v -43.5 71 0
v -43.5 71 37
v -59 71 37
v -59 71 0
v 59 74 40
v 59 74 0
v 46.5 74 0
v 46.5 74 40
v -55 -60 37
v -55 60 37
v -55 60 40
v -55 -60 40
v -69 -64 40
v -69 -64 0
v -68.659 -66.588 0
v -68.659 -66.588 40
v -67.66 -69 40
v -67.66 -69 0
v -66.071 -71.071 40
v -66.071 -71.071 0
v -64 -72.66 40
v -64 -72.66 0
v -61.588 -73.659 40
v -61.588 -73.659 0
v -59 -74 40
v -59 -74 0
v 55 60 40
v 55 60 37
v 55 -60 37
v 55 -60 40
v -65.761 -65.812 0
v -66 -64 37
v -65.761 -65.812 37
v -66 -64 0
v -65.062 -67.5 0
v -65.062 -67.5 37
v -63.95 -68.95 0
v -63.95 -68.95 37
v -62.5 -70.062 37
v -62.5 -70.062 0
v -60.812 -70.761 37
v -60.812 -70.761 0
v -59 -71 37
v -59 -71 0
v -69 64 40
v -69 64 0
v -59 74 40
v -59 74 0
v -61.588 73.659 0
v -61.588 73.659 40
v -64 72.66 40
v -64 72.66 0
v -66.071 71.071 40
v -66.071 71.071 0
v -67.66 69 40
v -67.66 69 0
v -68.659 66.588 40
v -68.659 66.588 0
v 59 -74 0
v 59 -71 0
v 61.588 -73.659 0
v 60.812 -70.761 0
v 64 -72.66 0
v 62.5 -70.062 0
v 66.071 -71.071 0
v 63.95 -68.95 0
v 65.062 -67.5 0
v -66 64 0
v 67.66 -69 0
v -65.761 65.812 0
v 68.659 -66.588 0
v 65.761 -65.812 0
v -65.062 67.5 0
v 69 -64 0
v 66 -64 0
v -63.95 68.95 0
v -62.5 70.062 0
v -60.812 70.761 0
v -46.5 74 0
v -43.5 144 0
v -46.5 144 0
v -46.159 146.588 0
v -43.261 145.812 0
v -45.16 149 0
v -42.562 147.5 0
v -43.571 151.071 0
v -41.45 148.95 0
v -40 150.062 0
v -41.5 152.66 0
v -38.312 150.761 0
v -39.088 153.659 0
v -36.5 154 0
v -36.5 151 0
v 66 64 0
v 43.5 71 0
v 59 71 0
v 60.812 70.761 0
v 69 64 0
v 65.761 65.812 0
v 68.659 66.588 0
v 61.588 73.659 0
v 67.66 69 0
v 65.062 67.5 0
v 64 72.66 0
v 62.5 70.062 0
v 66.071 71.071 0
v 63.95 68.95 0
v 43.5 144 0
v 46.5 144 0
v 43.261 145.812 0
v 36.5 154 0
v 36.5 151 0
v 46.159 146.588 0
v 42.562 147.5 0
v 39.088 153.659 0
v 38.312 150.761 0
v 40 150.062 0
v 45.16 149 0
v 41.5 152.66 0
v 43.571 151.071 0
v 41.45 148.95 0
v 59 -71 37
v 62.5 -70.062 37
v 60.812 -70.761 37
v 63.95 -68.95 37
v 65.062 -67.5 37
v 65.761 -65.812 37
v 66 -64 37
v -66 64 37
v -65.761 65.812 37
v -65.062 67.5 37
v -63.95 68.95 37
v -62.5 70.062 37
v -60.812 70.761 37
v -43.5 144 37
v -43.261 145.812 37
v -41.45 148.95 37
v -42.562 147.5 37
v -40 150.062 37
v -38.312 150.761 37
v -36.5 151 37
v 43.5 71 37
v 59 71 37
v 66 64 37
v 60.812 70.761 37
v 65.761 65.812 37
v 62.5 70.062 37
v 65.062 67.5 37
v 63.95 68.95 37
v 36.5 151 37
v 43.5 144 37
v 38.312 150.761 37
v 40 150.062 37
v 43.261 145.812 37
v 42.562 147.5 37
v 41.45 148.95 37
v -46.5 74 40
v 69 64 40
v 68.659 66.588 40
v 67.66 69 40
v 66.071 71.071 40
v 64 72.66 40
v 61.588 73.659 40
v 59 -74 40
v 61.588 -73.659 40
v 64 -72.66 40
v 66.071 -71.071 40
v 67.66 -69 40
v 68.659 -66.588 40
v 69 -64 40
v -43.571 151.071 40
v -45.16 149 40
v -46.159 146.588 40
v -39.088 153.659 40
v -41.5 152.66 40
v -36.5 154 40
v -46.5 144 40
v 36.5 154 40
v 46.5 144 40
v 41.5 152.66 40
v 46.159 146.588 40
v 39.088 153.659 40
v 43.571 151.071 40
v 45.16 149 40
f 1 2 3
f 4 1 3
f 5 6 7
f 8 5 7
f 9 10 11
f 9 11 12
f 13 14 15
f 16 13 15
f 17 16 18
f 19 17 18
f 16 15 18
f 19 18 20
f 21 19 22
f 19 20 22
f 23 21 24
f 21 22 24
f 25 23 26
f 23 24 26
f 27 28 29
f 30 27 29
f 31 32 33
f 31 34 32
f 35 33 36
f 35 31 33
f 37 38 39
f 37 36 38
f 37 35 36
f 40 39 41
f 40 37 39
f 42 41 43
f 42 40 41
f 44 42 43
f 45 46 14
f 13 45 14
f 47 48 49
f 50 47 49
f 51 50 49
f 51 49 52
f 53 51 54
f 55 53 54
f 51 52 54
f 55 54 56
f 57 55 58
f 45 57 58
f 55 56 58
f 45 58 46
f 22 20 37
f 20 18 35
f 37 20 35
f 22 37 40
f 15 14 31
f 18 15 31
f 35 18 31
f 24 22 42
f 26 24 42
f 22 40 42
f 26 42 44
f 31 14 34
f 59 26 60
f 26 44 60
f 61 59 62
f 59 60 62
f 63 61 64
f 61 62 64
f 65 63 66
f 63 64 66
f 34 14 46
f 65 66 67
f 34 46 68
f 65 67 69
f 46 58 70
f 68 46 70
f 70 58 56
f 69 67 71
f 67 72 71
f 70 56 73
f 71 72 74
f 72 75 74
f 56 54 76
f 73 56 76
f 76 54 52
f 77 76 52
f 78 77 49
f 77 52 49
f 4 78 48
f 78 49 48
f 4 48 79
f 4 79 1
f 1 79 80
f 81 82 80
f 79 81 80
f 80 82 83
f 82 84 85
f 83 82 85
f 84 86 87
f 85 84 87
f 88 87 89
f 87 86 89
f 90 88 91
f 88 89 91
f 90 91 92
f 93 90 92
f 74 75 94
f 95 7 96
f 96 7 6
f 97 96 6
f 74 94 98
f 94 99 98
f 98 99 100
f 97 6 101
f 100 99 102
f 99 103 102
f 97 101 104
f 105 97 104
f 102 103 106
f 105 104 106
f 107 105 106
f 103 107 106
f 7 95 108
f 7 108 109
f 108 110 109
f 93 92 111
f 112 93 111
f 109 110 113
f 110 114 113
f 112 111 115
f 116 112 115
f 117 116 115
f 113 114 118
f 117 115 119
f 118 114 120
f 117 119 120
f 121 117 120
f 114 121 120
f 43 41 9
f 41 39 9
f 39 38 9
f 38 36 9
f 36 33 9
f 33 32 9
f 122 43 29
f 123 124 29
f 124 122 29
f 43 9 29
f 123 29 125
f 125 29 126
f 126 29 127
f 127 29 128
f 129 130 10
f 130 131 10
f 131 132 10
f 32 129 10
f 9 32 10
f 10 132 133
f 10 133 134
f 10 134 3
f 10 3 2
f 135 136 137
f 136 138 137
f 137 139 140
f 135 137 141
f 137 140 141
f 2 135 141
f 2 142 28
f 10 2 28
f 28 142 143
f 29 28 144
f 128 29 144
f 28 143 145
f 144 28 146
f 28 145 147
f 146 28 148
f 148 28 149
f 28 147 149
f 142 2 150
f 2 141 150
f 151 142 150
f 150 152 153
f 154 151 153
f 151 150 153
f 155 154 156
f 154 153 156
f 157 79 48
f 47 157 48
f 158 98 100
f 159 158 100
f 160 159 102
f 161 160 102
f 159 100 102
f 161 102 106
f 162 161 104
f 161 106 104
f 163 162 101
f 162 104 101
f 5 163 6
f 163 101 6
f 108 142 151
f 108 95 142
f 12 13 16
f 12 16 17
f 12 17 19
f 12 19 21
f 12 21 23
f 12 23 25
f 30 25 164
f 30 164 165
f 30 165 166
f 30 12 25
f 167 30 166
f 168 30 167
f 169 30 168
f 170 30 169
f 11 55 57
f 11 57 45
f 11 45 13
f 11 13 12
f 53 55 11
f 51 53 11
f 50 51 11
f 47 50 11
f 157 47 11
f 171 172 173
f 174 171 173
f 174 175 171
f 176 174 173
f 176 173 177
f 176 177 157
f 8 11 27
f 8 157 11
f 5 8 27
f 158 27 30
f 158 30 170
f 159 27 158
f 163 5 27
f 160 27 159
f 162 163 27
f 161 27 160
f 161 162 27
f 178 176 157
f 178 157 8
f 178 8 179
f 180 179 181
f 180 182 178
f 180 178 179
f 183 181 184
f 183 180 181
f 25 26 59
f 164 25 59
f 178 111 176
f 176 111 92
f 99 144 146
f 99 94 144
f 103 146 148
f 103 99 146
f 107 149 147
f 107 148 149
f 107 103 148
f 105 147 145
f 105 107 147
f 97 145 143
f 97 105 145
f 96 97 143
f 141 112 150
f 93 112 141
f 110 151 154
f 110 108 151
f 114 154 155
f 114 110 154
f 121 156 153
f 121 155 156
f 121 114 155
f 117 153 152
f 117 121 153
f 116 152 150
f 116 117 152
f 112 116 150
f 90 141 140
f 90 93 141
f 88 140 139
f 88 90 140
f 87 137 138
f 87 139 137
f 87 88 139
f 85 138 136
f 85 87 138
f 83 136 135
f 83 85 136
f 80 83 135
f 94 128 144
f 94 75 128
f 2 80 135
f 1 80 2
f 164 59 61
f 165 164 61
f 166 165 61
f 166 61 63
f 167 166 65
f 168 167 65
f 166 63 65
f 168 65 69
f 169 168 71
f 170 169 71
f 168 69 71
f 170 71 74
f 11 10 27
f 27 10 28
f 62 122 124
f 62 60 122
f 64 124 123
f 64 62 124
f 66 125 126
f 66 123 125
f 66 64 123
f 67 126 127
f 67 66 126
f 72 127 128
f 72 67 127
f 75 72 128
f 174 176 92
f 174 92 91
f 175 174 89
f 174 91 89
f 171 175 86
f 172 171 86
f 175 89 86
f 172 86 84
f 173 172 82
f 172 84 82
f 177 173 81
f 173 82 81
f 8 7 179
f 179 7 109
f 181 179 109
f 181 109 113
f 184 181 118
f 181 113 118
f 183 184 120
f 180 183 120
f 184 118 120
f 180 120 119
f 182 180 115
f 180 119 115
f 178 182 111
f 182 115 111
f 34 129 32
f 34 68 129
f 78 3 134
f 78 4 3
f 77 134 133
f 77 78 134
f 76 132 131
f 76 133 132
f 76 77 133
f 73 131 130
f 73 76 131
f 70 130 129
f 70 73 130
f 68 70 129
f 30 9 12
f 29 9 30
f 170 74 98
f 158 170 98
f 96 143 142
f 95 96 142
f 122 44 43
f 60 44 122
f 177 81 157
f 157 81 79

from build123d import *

# Parameters (mm, degrees)
F1_DEPTH = 40
F2_T     = -3
F3_W     = 110
F3_H     = 120
F4_DEPTH = 25


with BuildPart() as f1:
    # F0 (on Top) → F1 (new body)
    with BuildSketch(Plane.XY):
        with BuildLine():
            ThreePointArc((-69, -64), (-66.0710678119, -71.0710678119), (-59, -74))
            Line((-59, -74), (59, -74))
            ThreePointArc((59, -74), (66.0710678119, -71.0710678119), (69, -64))
            Line((69, -64), (69, 64))
            ThreePointArc((69, 64), (66.0710678119, 71.0710678119), (59, 74))
            Line((59, 74), (46.5, 74))
            Line((46.5, 74), (46.5, 144))
            ThreePointArc((46.5, 144), (43.5710678119, 151.0710678119), (36.5, 154))
            Line((36.5, 154), (-36.5, 154))
            ThreePointArc((-36.5, 154), (-43.5710678119, 151.0710678119), (-46.5, 144))
            Line((-46.5, 144), (-46.5, 74))
            Line((-46.5, 74), (-59, 74))
            ThreePointArc((-59, 74), (-66.0710678119, 71.0710678119), (-69, 64))
            Line((-69, 64), (-69, -64))
        make_face()
    extrude(amount=F1_DEPTH)

    # F2
    f2_openings = [f1.faces().sort_by_distance(p)[0] for p in [
        (0, 30.345732, 0),
    ]]
    offset(amount=F2_T, openings=f2_openings, kind=Kind.INTERSECTION)

    # F3 (on face) → F4 (cut)
    with BuildSketch(Plane(origin=(0, 0, 37), x_dir=(1, 0, 0), z_dir=(0, 0, -1))):
        Rectangle(F3_W, F3_H)
    extrude(amount=-F4_DEPTH, mode=Mode.SUBTRACT)


solid = f1.part
